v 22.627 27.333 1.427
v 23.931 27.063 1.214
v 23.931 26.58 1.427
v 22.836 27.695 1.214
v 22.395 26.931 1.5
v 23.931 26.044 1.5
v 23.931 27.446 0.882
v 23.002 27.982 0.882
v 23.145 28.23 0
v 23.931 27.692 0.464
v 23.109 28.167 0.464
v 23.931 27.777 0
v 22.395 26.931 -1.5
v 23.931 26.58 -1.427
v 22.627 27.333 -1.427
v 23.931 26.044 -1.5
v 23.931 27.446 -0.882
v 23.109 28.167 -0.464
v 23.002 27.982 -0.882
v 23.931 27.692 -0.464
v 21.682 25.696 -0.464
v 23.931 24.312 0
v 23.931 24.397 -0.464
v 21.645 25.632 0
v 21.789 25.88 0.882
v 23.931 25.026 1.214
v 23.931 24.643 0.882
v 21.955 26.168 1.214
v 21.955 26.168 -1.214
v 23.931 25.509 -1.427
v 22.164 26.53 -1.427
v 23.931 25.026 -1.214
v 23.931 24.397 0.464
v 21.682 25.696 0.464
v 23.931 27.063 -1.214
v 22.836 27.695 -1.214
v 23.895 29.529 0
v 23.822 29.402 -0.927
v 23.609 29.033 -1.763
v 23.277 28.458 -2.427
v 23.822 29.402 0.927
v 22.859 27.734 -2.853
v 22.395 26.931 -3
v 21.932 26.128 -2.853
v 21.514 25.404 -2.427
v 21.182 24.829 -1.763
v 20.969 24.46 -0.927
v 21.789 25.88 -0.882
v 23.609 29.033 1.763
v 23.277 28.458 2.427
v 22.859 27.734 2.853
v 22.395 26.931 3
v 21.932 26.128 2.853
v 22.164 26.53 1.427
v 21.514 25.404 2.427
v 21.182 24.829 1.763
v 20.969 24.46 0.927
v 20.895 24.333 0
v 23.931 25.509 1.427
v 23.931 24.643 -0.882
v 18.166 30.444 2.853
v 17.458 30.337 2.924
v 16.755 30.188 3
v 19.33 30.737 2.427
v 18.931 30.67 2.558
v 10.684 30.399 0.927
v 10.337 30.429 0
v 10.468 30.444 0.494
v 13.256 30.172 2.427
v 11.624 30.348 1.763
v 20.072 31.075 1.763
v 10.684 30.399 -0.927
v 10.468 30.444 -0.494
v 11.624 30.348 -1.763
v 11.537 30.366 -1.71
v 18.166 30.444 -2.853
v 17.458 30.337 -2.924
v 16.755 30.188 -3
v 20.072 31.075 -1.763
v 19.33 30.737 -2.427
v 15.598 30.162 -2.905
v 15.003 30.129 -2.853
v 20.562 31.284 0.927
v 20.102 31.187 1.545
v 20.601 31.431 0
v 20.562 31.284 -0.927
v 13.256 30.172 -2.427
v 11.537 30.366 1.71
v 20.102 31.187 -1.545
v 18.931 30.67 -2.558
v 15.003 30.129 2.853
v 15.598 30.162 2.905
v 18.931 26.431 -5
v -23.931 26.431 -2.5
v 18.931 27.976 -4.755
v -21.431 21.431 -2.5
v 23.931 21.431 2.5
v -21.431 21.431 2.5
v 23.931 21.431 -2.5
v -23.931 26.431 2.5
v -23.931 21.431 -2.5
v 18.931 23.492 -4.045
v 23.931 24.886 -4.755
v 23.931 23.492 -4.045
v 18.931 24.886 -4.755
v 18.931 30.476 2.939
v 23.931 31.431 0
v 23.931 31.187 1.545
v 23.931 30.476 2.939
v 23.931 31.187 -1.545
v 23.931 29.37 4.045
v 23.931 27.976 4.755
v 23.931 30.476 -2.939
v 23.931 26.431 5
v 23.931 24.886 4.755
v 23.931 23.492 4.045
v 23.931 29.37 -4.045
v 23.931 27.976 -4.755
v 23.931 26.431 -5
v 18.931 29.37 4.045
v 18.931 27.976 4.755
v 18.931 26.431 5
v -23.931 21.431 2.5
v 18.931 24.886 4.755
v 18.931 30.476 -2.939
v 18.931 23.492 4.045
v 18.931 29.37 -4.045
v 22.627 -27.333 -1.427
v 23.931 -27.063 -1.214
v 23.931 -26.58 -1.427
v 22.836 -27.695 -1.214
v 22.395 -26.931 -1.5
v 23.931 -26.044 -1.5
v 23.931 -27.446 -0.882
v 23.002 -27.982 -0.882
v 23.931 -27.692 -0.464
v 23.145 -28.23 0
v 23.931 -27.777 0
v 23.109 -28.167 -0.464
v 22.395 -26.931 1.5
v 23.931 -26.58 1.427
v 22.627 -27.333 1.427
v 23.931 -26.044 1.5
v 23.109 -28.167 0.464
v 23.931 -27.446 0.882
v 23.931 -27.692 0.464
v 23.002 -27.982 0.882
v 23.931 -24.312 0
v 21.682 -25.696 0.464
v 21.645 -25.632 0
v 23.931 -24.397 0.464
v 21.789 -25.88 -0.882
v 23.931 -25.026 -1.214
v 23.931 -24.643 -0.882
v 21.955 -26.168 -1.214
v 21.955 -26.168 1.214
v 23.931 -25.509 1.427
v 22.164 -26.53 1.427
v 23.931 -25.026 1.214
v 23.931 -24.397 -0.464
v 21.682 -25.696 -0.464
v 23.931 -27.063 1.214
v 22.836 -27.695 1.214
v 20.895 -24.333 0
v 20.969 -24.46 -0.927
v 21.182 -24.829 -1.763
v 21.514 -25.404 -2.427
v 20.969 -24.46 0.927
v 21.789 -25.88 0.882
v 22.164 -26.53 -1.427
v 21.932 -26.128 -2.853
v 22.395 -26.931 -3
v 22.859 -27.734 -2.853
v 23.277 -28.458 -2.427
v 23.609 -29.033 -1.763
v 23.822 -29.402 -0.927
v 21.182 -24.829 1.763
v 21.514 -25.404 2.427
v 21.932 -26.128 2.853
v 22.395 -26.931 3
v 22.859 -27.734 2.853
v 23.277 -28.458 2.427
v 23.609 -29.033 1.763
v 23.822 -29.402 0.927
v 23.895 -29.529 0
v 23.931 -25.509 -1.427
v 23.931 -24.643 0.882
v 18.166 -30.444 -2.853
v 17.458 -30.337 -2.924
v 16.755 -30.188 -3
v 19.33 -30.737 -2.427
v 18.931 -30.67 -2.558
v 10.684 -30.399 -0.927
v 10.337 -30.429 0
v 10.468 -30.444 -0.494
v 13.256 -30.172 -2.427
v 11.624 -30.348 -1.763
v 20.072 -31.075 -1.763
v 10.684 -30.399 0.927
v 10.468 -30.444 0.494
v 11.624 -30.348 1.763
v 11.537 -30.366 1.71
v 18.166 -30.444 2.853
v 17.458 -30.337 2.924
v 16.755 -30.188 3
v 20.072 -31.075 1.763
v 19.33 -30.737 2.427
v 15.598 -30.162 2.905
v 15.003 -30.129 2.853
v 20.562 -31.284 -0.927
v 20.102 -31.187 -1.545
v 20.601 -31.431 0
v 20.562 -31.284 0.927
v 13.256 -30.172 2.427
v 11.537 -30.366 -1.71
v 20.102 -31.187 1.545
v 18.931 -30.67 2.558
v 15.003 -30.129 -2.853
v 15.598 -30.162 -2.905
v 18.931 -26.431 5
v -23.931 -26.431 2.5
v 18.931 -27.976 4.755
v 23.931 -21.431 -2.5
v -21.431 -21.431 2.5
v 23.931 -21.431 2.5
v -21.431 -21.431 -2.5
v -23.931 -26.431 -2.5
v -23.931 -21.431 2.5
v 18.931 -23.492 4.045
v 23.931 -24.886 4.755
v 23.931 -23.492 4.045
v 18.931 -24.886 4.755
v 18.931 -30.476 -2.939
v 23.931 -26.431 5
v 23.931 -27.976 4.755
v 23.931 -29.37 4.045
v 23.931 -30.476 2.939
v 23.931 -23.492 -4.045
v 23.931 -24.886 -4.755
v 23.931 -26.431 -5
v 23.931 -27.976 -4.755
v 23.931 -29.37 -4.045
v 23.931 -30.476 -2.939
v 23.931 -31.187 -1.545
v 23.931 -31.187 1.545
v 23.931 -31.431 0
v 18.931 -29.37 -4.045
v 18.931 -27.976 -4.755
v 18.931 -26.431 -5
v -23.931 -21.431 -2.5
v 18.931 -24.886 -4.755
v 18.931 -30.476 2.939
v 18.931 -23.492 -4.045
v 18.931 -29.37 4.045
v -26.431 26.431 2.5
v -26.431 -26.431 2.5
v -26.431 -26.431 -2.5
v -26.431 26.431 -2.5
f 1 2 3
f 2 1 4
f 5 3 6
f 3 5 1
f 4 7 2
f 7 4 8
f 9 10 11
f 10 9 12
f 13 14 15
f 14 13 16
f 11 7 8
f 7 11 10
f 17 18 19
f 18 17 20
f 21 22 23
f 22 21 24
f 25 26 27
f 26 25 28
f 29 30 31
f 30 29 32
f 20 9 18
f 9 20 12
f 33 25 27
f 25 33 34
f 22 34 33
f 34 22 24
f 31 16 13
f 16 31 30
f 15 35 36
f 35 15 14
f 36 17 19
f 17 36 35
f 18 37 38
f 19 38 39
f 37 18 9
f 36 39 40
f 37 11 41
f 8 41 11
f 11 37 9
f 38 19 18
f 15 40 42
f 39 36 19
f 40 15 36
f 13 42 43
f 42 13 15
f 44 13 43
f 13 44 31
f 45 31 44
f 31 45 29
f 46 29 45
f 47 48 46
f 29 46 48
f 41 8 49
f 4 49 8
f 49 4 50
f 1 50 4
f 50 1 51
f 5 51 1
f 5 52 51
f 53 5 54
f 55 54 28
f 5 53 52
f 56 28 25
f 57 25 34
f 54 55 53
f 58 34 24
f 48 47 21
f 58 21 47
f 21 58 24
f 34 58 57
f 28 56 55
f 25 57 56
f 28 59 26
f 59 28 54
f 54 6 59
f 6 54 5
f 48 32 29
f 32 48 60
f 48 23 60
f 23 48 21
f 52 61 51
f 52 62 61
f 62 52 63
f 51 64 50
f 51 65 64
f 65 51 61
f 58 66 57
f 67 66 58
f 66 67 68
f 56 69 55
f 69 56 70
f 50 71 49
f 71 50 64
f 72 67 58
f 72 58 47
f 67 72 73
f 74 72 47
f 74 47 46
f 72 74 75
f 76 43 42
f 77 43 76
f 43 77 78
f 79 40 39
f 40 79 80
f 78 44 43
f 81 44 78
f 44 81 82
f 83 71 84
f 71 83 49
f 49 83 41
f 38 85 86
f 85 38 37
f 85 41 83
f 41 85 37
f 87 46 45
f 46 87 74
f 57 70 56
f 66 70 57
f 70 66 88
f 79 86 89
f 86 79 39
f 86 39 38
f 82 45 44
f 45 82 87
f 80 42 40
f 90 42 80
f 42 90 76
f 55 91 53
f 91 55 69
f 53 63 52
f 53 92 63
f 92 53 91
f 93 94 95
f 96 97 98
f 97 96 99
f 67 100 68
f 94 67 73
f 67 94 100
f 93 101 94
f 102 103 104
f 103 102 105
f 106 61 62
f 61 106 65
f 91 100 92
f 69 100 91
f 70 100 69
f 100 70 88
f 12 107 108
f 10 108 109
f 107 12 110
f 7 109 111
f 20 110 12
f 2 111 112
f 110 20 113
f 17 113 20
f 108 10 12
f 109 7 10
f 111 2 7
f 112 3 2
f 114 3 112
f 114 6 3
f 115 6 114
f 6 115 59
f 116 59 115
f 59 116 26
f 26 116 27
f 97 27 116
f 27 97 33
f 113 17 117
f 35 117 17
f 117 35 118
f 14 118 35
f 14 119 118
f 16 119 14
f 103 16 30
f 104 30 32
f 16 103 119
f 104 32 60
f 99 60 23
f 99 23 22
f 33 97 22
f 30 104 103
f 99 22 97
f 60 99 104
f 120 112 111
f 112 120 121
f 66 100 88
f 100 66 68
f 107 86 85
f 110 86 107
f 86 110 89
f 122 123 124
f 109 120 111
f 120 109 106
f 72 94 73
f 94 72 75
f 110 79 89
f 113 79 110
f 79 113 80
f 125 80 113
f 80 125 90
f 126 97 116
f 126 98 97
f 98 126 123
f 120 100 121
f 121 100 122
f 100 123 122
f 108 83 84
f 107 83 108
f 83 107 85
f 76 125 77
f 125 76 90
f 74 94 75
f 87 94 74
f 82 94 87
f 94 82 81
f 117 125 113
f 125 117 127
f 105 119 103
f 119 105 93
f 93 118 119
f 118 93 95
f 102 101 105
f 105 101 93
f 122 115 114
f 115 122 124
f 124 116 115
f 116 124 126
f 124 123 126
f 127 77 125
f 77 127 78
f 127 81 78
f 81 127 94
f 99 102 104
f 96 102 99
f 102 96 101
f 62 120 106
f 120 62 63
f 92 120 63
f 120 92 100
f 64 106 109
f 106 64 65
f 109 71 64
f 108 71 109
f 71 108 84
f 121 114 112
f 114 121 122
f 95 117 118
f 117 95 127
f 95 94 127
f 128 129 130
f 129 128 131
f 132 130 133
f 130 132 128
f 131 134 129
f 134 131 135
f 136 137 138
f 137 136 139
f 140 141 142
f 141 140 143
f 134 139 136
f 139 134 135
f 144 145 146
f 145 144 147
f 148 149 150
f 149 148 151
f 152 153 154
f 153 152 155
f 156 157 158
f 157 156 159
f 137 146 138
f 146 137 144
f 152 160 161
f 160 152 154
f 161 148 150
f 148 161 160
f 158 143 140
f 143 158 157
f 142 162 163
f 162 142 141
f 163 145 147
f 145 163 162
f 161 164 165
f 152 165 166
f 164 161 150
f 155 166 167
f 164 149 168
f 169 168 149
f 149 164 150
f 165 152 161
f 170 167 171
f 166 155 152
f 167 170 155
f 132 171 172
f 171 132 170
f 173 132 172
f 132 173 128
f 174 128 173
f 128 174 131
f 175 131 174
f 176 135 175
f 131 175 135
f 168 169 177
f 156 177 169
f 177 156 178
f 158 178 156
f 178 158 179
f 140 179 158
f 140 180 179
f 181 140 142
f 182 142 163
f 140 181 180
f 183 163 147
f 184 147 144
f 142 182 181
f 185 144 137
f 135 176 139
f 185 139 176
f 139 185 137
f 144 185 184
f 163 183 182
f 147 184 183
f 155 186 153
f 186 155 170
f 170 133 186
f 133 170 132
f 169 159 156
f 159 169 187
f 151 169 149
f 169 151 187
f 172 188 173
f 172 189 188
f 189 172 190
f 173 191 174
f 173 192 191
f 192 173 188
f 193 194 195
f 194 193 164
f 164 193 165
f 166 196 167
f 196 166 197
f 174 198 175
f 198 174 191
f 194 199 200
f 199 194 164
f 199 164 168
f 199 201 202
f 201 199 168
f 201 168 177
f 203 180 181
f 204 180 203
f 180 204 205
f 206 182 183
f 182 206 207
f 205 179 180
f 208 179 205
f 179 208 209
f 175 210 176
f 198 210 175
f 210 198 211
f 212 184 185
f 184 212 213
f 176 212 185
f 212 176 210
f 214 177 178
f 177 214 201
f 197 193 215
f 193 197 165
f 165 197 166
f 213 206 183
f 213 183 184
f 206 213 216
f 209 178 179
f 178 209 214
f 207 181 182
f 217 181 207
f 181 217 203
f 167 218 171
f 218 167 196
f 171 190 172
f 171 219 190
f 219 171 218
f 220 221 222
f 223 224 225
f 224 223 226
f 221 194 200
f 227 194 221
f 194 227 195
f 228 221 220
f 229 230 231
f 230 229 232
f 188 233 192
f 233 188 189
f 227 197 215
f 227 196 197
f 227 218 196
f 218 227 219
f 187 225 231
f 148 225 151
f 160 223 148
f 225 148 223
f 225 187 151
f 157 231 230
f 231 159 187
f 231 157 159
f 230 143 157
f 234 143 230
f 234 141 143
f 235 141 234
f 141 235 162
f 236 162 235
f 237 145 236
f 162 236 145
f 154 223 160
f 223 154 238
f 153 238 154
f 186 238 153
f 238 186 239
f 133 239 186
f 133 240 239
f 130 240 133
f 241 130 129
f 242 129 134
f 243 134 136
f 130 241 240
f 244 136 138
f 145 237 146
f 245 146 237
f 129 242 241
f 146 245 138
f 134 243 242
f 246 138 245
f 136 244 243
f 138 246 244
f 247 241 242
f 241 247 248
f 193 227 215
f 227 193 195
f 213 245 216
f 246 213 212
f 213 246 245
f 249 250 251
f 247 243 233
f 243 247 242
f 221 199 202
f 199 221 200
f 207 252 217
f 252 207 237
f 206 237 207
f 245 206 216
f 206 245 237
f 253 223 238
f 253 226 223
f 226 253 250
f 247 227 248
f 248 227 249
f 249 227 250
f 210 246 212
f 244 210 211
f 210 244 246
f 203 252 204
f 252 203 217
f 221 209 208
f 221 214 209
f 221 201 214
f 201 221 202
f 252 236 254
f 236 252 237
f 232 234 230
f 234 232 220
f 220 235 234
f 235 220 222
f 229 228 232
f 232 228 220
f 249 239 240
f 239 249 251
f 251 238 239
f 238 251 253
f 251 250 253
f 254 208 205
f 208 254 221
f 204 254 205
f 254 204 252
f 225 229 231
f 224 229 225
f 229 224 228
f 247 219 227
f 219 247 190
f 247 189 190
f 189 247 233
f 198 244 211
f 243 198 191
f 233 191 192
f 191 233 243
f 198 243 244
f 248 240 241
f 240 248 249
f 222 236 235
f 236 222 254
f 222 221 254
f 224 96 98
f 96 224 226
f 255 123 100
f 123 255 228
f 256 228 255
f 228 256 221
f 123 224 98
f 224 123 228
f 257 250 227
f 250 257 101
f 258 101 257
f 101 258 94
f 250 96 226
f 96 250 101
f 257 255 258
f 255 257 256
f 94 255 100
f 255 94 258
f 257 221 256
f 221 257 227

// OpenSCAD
NEMA17W=25.4*(1*16+11)/16;
Wall=5;

for (a=[0:180:360]) {
rotate([a,0,0])
union() {    
difference(){
hull() {
translate([0,NEMA17W/2+Wall/2,0])
  cube([NEMA17W+Wall,Wall,Wall],center=true);
translate([NEMA17W/2-Wall/2,NEMA17W/2+Wall,0])
  rotate([0,90,0])
    cylinder(r=Wall,h=Wall,$fn=20);
}
translate([NEMA17W/2-Wall/2,NEMA17W/2+1.5*Wall,0])
rotate([0,-90,-30]) {
translate([0,0,-4]) {
translate([0,0,-10])
  cylinder(d=3,h=10,$fn=20);
cylinder(d=6,h=20,$fn=20);
}
}
}
}
}
translate([-NEMA17W/2-Wall/2,0,0])
cube([Wall,NEMA17W+2*Wall,Wall],center=true);
